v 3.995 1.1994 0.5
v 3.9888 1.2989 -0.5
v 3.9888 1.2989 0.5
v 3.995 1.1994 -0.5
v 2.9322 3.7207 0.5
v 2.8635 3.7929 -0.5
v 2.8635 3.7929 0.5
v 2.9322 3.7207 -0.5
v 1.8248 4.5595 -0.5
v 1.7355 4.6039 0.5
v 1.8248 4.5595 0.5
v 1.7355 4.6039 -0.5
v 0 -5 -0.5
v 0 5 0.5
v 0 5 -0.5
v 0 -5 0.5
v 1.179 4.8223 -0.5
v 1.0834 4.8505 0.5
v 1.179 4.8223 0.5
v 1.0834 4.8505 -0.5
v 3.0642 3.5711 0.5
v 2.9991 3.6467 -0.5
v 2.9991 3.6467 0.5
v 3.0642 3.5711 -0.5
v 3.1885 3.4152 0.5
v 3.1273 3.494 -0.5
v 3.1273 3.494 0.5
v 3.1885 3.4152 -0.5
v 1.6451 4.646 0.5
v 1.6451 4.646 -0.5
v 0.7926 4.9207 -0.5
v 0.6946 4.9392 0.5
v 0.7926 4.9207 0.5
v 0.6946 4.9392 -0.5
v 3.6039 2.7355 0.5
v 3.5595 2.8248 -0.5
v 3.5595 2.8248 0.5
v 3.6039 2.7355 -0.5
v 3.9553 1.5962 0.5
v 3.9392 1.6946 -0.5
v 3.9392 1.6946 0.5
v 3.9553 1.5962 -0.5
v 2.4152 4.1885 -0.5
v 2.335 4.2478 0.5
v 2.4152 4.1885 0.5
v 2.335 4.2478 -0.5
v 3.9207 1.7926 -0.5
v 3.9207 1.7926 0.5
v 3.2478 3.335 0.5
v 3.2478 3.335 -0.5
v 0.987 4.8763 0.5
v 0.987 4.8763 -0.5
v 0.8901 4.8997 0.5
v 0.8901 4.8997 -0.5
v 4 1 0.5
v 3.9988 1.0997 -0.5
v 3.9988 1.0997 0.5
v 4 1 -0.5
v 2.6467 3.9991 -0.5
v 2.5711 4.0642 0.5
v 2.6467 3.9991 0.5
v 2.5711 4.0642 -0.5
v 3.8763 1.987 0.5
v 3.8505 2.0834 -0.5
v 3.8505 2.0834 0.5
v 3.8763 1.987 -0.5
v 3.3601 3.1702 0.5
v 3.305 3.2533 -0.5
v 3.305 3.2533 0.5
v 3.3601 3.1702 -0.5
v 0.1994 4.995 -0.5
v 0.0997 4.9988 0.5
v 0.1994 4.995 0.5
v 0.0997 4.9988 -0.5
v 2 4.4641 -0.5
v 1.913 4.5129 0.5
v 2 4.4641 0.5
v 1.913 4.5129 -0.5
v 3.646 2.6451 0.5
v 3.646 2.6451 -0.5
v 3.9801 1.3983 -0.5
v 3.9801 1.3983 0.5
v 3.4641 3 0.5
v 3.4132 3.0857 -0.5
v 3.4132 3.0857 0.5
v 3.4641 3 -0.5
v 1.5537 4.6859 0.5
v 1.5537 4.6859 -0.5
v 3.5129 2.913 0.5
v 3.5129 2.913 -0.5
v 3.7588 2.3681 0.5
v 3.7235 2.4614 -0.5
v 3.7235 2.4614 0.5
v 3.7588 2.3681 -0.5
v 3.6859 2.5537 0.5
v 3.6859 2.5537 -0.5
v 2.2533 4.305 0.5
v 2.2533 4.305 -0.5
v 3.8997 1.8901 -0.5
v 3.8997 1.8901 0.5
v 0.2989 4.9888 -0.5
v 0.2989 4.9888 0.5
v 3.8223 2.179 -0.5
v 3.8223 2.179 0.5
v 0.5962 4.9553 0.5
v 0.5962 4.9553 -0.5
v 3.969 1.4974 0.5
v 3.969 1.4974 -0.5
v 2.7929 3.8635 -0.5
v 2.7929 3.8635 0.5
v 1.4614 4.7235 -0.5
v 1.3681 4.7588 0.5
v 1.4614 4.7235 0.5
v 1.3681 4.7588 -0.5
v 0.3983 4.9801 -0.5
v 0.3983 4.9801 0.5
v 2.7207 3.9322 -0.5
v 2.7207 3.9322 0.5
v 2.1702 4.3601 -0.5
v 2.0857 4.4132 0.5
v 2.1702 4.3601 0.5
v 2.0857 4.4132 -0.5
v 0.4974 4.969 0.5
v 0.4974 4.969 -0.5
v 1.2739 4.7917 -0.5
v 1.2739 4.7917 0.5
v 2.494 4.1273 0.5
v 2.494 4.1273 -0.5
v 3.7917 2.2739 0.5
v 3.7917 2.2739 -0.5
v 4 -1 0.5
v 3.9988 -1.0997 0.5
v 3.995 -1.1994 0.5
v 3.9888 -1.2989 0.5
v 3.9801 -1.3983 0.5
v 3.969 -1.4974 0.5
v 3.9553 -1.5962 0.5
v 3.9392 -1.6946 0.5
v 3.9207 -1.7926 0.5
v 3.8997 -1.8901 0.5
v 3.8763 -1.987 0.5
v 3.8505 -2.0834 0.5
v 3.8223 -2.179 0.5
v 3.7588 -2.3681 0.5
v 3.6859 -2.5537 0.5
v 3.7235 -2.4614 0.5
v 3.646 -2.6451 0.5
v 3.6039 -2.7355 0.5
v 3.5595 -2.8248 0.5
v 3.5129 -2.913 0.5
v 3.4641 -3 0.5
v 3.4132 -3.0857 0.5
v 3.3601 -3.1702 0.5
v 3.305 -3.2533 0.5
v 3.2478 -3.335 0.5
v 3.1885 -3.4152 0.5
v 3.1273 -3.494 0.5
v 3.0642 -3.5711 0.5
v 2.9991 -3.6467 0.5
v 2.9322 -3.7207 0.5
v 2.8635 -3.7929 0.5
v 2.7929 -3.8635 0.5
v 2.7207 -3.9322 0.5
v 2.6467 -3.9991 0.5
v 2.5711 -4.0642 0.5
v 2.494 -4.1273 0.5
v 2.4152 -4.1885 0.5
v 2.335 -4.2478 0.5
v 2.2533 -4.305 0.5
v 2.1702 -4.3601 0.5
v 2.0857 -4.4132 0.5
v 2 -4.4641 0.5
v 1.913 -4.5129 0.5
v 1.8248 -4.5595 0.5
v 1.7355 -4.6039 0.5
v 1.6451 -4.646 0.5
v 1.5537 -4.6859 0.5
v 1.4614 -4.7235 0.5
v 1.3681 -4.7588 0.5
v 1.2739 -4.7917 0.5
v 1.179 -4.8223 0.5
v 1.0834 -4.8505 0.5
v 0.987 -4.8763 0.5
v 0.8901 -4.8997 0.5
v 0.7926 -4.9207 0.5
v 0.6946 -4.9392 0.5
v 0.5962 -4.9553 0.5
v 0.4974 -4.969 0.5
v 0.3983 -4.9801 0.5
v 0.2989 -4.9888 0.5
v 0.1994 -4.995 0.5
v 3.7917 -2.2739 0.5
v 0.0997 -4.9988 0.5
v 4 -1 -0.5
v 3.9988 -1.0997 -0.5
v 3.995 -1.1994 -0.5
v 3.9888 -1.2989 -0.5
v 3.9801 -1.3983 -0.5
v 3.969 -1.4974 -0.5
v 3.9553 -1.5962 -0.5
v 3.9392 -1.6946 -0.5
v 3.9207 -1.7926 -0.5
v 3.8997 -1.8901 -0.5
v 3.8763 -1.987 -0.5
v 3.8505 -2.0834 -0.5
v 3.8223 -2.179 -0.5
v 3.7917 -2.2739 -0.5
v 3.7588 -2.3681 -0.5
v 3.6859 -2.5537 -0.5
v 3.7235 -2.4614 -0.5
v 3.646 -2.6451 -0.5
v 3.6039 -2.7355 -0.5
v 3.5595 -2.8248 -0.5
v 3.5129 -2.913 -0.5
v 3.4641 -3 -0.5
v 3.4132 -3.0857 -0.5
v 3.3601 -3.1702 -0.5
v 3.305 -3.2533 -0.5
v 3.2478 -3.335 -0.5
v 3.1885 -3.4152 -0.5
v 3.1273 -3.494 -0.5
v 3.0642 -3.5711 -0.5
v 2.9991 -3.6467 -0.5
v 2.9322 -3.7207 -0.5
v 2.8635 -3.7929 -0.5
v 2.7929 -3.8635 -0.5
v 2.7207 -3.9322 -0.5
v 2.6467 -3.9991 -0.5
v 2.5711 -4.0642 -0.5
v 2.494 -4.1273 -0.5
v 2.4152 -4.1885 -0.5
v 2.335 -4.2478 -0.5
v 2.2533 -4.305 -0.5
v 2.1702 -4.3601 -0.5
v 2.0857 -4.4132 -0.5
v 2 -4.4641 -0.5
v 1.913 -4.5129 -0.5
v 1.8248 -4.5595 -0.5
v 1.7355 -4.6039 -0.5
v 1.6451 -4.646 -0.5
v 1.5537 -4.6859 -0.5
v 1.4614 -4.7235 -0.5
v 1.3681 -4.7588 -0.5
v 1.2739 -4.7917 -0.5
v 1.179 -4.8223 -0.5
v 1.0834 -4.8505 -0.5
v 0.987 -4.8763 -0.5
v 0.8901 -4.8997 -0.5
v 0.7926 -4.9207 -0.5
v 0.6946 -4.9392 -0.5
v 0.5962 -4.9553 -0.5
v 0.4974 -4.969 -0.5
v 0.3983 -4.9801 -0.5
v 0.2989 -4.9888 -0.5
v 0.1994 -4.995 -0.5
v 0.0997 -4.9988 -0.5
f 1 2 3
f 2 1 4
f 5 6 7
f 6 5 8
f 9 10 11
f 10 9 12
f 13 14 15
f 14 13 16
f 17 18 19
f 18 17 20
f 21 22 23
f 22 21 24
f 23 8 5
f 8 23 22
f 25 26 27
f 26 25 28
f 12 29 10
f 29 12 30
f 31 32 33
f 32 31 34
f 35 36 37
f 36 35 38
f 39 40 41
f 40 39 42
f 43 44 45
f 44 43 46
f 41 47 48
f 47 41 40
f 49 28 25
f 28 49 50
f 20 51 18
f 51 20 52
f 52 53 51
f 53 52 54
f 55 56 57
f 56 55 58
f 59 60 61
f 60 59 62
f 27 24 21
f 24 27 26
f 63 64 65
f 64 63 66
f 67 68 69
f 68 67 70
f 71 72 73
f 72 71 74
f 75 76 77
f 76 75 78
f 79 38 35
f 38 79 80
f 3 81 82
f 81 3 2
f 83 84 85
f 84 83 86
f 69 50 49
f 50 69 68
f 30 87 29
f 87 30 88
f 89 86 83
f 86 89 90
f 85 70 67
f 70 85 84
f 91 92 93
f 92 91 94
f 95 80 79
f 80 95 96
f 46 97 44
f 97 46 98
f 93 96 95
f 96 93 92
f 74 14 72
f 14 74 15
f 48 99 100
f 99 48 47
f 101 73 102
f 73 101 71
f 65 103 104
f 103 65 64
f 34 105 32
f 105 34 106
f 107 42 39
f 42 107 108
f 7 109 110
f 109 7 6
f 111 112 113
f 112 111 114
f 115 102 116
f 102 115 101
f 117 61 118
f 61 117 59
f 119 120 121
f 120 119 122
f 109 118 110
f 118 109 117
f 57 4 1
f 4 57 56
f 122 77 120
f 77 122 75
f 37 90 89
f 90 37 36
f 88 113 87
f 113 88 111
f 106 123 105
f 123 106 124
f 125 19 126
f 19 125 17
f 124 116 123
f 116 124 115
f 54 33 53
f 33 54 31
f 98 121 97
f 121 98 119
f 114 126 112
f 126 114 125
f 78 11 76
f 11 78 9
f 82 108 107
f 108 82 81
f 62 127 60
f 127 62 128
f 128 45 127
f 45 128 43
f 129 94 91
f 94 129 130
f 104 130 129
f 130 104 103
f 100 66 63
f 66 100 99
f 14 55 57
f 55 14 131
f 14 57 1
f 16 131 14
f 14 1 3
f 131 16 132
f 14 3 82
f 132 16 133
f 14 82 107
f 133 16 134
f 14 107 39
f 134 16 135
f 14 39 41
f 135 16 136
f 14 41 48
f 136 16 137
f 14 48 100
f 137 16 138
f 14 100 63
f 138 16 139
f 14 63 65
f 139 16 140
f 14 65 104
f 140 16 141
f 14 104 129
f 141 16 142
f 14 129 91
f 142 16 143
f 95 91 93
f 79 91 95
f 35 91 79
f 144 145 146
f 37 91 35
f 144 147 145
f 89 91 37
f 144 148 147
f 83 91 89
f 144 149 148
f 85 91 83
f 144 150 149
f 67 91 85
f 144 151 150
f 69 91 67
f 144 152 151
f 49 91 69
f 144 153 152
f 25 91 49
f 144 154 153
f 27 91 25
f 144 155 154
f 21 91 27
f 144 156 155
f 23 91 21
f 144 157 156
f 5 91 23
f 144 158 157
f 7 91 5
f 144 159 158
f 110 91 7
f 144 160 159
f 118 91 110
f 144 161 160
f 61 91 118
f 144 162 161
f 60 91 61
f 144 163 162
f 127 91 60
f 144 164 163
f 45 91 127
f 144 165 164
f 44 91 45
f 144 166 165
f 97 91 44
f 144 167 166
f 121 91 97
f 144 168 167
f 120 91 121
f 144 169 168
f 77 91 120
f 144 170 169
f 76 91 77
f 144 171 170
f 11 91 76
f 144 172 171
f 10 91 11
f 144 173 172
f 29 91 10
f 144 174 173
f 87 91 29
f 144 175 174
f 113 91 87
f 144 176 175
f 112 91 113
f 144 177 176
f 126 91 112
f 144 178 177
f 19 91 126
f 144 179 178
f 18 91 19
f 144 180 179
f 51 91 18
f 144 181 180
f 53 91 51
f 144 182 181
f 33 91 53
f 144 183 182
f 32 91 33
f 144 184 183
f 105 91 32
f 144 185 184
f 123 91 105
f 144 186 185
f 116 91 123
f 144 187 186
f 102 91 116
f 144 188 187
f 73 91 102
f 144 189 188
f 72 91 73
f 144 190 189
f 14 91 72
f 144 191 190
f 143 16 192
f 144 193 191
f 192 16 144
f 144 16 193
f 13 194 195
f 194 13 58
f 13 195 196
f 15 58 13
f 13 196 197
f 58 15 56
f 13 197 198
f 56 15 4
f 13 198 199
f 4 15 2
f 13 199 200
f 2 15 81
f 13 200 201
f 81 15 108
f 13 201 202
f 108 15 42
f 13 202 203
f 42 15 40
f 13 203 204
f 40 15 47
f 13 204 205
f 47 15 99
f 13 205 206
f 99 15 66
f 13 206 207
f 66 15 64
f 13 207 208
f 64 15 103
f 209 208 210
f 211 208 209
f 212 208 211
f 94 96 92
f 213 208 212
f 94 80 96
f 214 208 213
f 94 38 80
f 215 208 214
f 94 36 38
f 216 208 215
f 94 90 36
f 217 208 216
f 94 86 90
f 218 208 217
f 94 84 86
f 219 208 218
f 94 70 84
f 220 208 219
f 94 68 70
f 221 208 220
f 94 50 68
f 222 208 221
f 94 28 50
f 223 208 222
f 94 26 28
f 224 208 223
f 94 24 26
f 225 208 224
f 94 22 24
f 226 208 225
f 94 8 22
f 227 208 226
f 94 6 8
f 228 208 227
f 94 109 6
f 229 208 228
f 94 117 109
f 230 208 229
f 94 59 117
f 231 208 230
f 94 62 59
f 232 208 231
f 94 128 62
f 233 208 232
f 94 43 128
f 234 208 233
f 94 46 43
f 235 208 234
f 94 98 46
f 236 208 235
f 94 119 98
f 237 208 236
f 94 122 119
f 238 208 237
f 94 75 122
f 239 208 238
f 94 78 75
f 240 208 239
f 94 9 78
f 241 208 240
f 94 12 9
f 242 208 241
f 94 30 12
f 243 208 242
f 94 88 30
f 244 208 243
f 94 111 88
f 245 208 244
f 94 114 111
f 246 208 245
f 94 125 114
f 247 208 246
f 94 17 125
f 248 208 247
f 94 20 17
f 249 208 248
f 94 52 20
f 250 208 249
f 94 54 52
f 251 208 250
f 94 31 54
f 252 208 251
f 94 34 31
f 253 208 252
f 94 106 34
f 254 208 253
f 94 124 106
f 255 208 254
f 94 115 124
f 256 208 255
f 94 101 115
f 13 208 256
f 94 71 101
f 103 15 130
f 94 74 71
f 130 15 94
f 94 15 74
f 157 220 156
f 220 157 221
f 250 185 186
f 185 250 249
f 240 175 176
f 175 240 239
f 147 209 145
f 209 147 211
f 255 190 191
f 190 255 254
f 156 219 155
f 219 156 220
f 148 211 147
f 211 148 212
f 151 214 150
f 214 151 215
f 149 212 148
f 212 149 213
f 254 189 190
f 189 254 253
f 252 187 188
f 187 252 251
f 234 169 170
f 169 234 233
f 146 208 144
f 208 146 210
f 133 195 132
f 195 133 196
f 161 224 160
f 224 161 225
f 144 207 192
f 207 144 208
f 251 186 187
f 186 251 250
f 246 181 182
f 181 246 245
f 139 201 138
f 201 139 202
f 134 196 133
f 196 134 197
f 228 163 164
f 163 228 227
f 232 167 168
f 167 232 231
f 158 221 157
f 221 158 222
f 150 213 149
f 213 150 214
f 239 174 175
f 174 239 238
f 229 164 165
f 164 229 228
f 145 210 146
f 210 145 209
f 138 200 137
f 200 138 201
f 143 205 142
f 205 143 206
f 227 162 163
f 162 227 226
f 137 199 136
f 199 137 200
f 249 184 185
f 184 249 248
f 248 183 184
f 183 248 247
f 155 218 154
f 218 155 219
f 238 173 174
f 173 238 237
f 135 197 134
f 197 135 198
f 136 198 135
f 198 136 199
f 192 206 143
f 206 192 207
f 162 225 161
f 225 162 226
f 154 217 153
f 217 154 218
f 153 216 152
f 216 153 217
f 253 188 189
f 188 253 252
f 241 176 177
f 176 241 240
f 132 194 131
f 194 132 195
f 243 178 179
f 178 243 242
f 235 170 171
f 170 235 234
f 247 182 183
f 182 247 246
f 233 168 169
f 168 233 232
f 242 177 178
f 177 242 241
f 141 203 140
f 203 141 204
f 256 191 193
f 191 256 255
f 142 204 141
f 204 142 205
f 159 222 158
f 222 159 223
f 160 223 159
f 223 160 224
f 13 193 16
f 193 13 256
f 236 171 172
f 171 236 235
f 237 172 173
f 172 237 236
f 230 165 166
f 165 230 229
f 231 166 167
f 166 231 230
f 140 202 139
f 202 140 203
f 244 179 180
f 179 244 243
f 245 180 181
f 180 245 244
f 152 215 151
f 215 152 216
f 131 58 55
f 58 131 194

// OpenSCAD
// file: functions.scad
/////////////////////////////////////////////////////////////////////////////////////////////////////////////////////////
// Auto generate a rectangle with rounded edges and corners
/////////////////////////////////////////////////////////////////////////////////////////////////////////////////////////
module rect_round(length,width,depth,rad) {
    
    // long sides
    l1 = length - 2*rad;
      
    // wide sides
    w1 = width - 2*rad;
    
    // deep sides
    d1 = depth - 2 * rad;
    
    // central rect l1 x w1 x d1
    
    union() {
        // corner spheres - locations defined by l1 w1 d1
        for ( i = [-1,1] ) {
            for ( j = [-1,1] ) {
                for ( k = [-1,1] ) {
                    //spheres
                    translate([i*(l1/2),j*(w1/2),k*(d1/2)]){
                        sphere(r = rad, center = true);                        
                        }  
                    }
                }
            }
        
        // face rectangles
        for ( i = [-1,1] ) {
            
            //x
            translate([i*(l1+rad)/2,0,0]){
                cube([rad,w1,d1],center=true); 
                }
            //y
            translate([0,i*(w1+rad)/2,0]){
                cube([l1,rad,d1],center=true); 
                }
            //z
            translate([0,0,i*(d1+rad)/2]){
                cube([l1,w1,rad],center=true); 
                }
            }
         // edge cylinders       
         for ( i = [-1,1] ) {
             for ( j = [-1,1] ){
            // short
            translate([i*(l1/2),j*(w1/2),0]){
                cylinder(h=d1 ,r=rad, center=true); 
                }
            // mid
            translate([i*(l1/2),0,j*(d1/2)]){
                rotate(a=90,v=[1,0,0]){
                    cylinder(h=w1 ,r=rad, center=true);
                    }
                }
            // long
            translate([0,i*(w1/2),j*(d1/2)]){
                rotate(a=90,v=[0,1,0]){
                    cylinder(h=l1 ,r=rad, center=true);
                    }
                }
            }
            }  
            // central cube
            cube([l1,w1,d1],center=true);
        }
    }
//////////////////////////////////////////////////////////////////////////////////////////////////////////////////

//////////////////////////////////////////////////////////////////////////////////////////////////////////////////
// Auto generate cutouts for nuts, where length is the distance b/w parallel sides and thickness is the nut thickness or cutout depth
/////////////////////////////////////////////////////////////////////////////////////////////////////////////////////////
module hex_nut_cutout(length, thickness) {



   
   hex_side_length = length / sqrt(3);

   union(){
      cube([hex_side_length,thickness,length], center=true);
      rotate([0,60,0]){cube([hex_side_length,thickness,length], center=true);}
      rotate([0,120,0]){cube([hex_side_length,thickness,length], center=true);}
   }
}
/////////////////////////////////////////////////////////////////////////////////////////////////////////////////////////

/////////////////////////////////////////////////////////////////////////////////////////////////////////////////////////
// Auto generate a spherical section with a flat face, where radius is the radius  of the sphere, and fraction is the of the diameter required
/////////////////////////////////////////////////////////////////////////////////////////////////////////////////////////
module  sphere_fraction(radius, fraction) {

difference() {
   
   sphere( r=radius, center=true);

   translate( [ 0, 0, -(fraction)*radius]){ cube([ 2.01*radius, 2.01*radius, 2.001*(1-fraction)*radius], center=true);}

}
}
/////////////////////////////////////////////////////////////////////////////////////////////////////////////////////////

/////////////////////////////////////////////////////////////////////////////////////////////////////////////////////////
// Gear Generator
/////////////////////////////////////////////////////////////////////////////////////////////////////////////////////////

module gear_generator( number_of_teeth, pitch, thickness, pivot ){

// Calculated
P = PI / pitch;
diameter = number_of_teeth/P;


a = 1/P;
b = 1.25/P;
ht = 2.25/P;
c = 0.25/P;
rf = 0.30/P;
Db = diameter*cos(20);
Do = (number_of_teeth+2)/P;
Dr = (number_of_teeth-2.5)/P;
t = 1.5708/P;
r = diameter/2;
h = diameter-Db;

l = 0.5*Db - 0.5*diameter*sin(360/(4*number_of_teeth));
//l = 0.5*Db -t/2;

echo(diameter,a,b,ht,c,rf,Db/2,Do,Dr,t,r,h,l);

// Bevel the edges
run = 0.5*(Do-diameter);
rise = 0.364*run;
bulk = thickness - 2*rise;
disp = thickness/2 - 0.5*rise;

echo(run, rise, bulk, disp);


difference(){
intersection(){
//envelope
union(){
translate([0,0, disp]){cylinder(r1 = Do/2, r2 = Do/2-run, h=rise,center=true); }
cylinder(r = Do/2, h=bulk, center=true);
translate([0,0,-disp]){cylinder(r1 = Do/2-run, r2 = Do/2, h=rise,center=true); }
}

//union(){
//translate([0,0,(1/2)*thickness]){cylinder(r1 =  }
//cylinder(r = Do/2, h=(2/3)*thickness, center=true);
//}

union(){
cylinder(r = Dr/2, h=thickness, center=true);
for(i=[1:number_of_teeth]){

angle = (i-1)*360/number_of_teeth;

rotate( [ 0, 0, angle] ){
   translate( [ 0.5*Db, 0, 0] ) {
         intersection() {
         translate([0,l,0]){cylinder( r = 0.5*Db, h=thickness, center=true);}
         translate([0,-l,0]){cylinder( r = 0.5*Db, h=thickness, center=true);}
         }
      }
   }
}
}
}

cylinder(r=pivot, h=thickness+1, center=true);
}
}
/////////////////////////////////////////////////////////////////////////////////////////////////////////////////////////

/////////////////////////////////////////////////////////////////////////////////////////////////////////////////////////
// Rounded Edges for Extrusions
/////////////////////////////////////////////////////////////////////////////////////////////////////////////////////////

module round_edge_extrusion( cor_rad, tot_dep) {

dep = tot_dep - 2*cor_rad;
offset = 0.5*dep;


// shape to be extruded
union() {
// radius
for( i=[0,1]) {

translate( [ 0, cos(180*i)*offset, 0] ) {
rotate_extrude( angle = 90-i*180 ) {
translate( [ cor_rad-0.5*cor_rad, 0, 0] ) {square( [cor_rad, 1], center=true);}
}
}
}

translate( [ cor_rad-0.5*cor_rad, 0, 0] ) {cube([ cor_rad, dep, 1], center=true);}

}
}
/////////////////////////////////////////////////////////////////////////////////////////////////////////////////////////
// main file
// Extrution section eith rounded corners

use <functions.scad>

$fa=.1; // default minimum facet angle is now 0.5
$fs=.1; // default minimum facet size is now 0.5 mm

round_edge_extrusion( 4, 10);

//cor_rad = 3;
//tot_dep = 10;
//
//dep = tot_dep - 2*cor_rad;
//offset = 0.5*dep;
//
//
//// shape to be extruded
//union() {
//// radius
//for( i=[0,1]) {
//
//translate( [ 0, cos(180*i)*offset, 0] ) {
//rotate_extrude( angle = 90-i*180 ) {
//translate( [ cor_rad-0.5*cor_rad, 0, 0] ) {square( [cor_rad, 1], center=true);}
//}
//}
//}
//
//translate( [ cor_rad-0.5*cor_rad, 0, 0] ) {cube([ cor_rad, dep, 1], center=true);}
//
//}
